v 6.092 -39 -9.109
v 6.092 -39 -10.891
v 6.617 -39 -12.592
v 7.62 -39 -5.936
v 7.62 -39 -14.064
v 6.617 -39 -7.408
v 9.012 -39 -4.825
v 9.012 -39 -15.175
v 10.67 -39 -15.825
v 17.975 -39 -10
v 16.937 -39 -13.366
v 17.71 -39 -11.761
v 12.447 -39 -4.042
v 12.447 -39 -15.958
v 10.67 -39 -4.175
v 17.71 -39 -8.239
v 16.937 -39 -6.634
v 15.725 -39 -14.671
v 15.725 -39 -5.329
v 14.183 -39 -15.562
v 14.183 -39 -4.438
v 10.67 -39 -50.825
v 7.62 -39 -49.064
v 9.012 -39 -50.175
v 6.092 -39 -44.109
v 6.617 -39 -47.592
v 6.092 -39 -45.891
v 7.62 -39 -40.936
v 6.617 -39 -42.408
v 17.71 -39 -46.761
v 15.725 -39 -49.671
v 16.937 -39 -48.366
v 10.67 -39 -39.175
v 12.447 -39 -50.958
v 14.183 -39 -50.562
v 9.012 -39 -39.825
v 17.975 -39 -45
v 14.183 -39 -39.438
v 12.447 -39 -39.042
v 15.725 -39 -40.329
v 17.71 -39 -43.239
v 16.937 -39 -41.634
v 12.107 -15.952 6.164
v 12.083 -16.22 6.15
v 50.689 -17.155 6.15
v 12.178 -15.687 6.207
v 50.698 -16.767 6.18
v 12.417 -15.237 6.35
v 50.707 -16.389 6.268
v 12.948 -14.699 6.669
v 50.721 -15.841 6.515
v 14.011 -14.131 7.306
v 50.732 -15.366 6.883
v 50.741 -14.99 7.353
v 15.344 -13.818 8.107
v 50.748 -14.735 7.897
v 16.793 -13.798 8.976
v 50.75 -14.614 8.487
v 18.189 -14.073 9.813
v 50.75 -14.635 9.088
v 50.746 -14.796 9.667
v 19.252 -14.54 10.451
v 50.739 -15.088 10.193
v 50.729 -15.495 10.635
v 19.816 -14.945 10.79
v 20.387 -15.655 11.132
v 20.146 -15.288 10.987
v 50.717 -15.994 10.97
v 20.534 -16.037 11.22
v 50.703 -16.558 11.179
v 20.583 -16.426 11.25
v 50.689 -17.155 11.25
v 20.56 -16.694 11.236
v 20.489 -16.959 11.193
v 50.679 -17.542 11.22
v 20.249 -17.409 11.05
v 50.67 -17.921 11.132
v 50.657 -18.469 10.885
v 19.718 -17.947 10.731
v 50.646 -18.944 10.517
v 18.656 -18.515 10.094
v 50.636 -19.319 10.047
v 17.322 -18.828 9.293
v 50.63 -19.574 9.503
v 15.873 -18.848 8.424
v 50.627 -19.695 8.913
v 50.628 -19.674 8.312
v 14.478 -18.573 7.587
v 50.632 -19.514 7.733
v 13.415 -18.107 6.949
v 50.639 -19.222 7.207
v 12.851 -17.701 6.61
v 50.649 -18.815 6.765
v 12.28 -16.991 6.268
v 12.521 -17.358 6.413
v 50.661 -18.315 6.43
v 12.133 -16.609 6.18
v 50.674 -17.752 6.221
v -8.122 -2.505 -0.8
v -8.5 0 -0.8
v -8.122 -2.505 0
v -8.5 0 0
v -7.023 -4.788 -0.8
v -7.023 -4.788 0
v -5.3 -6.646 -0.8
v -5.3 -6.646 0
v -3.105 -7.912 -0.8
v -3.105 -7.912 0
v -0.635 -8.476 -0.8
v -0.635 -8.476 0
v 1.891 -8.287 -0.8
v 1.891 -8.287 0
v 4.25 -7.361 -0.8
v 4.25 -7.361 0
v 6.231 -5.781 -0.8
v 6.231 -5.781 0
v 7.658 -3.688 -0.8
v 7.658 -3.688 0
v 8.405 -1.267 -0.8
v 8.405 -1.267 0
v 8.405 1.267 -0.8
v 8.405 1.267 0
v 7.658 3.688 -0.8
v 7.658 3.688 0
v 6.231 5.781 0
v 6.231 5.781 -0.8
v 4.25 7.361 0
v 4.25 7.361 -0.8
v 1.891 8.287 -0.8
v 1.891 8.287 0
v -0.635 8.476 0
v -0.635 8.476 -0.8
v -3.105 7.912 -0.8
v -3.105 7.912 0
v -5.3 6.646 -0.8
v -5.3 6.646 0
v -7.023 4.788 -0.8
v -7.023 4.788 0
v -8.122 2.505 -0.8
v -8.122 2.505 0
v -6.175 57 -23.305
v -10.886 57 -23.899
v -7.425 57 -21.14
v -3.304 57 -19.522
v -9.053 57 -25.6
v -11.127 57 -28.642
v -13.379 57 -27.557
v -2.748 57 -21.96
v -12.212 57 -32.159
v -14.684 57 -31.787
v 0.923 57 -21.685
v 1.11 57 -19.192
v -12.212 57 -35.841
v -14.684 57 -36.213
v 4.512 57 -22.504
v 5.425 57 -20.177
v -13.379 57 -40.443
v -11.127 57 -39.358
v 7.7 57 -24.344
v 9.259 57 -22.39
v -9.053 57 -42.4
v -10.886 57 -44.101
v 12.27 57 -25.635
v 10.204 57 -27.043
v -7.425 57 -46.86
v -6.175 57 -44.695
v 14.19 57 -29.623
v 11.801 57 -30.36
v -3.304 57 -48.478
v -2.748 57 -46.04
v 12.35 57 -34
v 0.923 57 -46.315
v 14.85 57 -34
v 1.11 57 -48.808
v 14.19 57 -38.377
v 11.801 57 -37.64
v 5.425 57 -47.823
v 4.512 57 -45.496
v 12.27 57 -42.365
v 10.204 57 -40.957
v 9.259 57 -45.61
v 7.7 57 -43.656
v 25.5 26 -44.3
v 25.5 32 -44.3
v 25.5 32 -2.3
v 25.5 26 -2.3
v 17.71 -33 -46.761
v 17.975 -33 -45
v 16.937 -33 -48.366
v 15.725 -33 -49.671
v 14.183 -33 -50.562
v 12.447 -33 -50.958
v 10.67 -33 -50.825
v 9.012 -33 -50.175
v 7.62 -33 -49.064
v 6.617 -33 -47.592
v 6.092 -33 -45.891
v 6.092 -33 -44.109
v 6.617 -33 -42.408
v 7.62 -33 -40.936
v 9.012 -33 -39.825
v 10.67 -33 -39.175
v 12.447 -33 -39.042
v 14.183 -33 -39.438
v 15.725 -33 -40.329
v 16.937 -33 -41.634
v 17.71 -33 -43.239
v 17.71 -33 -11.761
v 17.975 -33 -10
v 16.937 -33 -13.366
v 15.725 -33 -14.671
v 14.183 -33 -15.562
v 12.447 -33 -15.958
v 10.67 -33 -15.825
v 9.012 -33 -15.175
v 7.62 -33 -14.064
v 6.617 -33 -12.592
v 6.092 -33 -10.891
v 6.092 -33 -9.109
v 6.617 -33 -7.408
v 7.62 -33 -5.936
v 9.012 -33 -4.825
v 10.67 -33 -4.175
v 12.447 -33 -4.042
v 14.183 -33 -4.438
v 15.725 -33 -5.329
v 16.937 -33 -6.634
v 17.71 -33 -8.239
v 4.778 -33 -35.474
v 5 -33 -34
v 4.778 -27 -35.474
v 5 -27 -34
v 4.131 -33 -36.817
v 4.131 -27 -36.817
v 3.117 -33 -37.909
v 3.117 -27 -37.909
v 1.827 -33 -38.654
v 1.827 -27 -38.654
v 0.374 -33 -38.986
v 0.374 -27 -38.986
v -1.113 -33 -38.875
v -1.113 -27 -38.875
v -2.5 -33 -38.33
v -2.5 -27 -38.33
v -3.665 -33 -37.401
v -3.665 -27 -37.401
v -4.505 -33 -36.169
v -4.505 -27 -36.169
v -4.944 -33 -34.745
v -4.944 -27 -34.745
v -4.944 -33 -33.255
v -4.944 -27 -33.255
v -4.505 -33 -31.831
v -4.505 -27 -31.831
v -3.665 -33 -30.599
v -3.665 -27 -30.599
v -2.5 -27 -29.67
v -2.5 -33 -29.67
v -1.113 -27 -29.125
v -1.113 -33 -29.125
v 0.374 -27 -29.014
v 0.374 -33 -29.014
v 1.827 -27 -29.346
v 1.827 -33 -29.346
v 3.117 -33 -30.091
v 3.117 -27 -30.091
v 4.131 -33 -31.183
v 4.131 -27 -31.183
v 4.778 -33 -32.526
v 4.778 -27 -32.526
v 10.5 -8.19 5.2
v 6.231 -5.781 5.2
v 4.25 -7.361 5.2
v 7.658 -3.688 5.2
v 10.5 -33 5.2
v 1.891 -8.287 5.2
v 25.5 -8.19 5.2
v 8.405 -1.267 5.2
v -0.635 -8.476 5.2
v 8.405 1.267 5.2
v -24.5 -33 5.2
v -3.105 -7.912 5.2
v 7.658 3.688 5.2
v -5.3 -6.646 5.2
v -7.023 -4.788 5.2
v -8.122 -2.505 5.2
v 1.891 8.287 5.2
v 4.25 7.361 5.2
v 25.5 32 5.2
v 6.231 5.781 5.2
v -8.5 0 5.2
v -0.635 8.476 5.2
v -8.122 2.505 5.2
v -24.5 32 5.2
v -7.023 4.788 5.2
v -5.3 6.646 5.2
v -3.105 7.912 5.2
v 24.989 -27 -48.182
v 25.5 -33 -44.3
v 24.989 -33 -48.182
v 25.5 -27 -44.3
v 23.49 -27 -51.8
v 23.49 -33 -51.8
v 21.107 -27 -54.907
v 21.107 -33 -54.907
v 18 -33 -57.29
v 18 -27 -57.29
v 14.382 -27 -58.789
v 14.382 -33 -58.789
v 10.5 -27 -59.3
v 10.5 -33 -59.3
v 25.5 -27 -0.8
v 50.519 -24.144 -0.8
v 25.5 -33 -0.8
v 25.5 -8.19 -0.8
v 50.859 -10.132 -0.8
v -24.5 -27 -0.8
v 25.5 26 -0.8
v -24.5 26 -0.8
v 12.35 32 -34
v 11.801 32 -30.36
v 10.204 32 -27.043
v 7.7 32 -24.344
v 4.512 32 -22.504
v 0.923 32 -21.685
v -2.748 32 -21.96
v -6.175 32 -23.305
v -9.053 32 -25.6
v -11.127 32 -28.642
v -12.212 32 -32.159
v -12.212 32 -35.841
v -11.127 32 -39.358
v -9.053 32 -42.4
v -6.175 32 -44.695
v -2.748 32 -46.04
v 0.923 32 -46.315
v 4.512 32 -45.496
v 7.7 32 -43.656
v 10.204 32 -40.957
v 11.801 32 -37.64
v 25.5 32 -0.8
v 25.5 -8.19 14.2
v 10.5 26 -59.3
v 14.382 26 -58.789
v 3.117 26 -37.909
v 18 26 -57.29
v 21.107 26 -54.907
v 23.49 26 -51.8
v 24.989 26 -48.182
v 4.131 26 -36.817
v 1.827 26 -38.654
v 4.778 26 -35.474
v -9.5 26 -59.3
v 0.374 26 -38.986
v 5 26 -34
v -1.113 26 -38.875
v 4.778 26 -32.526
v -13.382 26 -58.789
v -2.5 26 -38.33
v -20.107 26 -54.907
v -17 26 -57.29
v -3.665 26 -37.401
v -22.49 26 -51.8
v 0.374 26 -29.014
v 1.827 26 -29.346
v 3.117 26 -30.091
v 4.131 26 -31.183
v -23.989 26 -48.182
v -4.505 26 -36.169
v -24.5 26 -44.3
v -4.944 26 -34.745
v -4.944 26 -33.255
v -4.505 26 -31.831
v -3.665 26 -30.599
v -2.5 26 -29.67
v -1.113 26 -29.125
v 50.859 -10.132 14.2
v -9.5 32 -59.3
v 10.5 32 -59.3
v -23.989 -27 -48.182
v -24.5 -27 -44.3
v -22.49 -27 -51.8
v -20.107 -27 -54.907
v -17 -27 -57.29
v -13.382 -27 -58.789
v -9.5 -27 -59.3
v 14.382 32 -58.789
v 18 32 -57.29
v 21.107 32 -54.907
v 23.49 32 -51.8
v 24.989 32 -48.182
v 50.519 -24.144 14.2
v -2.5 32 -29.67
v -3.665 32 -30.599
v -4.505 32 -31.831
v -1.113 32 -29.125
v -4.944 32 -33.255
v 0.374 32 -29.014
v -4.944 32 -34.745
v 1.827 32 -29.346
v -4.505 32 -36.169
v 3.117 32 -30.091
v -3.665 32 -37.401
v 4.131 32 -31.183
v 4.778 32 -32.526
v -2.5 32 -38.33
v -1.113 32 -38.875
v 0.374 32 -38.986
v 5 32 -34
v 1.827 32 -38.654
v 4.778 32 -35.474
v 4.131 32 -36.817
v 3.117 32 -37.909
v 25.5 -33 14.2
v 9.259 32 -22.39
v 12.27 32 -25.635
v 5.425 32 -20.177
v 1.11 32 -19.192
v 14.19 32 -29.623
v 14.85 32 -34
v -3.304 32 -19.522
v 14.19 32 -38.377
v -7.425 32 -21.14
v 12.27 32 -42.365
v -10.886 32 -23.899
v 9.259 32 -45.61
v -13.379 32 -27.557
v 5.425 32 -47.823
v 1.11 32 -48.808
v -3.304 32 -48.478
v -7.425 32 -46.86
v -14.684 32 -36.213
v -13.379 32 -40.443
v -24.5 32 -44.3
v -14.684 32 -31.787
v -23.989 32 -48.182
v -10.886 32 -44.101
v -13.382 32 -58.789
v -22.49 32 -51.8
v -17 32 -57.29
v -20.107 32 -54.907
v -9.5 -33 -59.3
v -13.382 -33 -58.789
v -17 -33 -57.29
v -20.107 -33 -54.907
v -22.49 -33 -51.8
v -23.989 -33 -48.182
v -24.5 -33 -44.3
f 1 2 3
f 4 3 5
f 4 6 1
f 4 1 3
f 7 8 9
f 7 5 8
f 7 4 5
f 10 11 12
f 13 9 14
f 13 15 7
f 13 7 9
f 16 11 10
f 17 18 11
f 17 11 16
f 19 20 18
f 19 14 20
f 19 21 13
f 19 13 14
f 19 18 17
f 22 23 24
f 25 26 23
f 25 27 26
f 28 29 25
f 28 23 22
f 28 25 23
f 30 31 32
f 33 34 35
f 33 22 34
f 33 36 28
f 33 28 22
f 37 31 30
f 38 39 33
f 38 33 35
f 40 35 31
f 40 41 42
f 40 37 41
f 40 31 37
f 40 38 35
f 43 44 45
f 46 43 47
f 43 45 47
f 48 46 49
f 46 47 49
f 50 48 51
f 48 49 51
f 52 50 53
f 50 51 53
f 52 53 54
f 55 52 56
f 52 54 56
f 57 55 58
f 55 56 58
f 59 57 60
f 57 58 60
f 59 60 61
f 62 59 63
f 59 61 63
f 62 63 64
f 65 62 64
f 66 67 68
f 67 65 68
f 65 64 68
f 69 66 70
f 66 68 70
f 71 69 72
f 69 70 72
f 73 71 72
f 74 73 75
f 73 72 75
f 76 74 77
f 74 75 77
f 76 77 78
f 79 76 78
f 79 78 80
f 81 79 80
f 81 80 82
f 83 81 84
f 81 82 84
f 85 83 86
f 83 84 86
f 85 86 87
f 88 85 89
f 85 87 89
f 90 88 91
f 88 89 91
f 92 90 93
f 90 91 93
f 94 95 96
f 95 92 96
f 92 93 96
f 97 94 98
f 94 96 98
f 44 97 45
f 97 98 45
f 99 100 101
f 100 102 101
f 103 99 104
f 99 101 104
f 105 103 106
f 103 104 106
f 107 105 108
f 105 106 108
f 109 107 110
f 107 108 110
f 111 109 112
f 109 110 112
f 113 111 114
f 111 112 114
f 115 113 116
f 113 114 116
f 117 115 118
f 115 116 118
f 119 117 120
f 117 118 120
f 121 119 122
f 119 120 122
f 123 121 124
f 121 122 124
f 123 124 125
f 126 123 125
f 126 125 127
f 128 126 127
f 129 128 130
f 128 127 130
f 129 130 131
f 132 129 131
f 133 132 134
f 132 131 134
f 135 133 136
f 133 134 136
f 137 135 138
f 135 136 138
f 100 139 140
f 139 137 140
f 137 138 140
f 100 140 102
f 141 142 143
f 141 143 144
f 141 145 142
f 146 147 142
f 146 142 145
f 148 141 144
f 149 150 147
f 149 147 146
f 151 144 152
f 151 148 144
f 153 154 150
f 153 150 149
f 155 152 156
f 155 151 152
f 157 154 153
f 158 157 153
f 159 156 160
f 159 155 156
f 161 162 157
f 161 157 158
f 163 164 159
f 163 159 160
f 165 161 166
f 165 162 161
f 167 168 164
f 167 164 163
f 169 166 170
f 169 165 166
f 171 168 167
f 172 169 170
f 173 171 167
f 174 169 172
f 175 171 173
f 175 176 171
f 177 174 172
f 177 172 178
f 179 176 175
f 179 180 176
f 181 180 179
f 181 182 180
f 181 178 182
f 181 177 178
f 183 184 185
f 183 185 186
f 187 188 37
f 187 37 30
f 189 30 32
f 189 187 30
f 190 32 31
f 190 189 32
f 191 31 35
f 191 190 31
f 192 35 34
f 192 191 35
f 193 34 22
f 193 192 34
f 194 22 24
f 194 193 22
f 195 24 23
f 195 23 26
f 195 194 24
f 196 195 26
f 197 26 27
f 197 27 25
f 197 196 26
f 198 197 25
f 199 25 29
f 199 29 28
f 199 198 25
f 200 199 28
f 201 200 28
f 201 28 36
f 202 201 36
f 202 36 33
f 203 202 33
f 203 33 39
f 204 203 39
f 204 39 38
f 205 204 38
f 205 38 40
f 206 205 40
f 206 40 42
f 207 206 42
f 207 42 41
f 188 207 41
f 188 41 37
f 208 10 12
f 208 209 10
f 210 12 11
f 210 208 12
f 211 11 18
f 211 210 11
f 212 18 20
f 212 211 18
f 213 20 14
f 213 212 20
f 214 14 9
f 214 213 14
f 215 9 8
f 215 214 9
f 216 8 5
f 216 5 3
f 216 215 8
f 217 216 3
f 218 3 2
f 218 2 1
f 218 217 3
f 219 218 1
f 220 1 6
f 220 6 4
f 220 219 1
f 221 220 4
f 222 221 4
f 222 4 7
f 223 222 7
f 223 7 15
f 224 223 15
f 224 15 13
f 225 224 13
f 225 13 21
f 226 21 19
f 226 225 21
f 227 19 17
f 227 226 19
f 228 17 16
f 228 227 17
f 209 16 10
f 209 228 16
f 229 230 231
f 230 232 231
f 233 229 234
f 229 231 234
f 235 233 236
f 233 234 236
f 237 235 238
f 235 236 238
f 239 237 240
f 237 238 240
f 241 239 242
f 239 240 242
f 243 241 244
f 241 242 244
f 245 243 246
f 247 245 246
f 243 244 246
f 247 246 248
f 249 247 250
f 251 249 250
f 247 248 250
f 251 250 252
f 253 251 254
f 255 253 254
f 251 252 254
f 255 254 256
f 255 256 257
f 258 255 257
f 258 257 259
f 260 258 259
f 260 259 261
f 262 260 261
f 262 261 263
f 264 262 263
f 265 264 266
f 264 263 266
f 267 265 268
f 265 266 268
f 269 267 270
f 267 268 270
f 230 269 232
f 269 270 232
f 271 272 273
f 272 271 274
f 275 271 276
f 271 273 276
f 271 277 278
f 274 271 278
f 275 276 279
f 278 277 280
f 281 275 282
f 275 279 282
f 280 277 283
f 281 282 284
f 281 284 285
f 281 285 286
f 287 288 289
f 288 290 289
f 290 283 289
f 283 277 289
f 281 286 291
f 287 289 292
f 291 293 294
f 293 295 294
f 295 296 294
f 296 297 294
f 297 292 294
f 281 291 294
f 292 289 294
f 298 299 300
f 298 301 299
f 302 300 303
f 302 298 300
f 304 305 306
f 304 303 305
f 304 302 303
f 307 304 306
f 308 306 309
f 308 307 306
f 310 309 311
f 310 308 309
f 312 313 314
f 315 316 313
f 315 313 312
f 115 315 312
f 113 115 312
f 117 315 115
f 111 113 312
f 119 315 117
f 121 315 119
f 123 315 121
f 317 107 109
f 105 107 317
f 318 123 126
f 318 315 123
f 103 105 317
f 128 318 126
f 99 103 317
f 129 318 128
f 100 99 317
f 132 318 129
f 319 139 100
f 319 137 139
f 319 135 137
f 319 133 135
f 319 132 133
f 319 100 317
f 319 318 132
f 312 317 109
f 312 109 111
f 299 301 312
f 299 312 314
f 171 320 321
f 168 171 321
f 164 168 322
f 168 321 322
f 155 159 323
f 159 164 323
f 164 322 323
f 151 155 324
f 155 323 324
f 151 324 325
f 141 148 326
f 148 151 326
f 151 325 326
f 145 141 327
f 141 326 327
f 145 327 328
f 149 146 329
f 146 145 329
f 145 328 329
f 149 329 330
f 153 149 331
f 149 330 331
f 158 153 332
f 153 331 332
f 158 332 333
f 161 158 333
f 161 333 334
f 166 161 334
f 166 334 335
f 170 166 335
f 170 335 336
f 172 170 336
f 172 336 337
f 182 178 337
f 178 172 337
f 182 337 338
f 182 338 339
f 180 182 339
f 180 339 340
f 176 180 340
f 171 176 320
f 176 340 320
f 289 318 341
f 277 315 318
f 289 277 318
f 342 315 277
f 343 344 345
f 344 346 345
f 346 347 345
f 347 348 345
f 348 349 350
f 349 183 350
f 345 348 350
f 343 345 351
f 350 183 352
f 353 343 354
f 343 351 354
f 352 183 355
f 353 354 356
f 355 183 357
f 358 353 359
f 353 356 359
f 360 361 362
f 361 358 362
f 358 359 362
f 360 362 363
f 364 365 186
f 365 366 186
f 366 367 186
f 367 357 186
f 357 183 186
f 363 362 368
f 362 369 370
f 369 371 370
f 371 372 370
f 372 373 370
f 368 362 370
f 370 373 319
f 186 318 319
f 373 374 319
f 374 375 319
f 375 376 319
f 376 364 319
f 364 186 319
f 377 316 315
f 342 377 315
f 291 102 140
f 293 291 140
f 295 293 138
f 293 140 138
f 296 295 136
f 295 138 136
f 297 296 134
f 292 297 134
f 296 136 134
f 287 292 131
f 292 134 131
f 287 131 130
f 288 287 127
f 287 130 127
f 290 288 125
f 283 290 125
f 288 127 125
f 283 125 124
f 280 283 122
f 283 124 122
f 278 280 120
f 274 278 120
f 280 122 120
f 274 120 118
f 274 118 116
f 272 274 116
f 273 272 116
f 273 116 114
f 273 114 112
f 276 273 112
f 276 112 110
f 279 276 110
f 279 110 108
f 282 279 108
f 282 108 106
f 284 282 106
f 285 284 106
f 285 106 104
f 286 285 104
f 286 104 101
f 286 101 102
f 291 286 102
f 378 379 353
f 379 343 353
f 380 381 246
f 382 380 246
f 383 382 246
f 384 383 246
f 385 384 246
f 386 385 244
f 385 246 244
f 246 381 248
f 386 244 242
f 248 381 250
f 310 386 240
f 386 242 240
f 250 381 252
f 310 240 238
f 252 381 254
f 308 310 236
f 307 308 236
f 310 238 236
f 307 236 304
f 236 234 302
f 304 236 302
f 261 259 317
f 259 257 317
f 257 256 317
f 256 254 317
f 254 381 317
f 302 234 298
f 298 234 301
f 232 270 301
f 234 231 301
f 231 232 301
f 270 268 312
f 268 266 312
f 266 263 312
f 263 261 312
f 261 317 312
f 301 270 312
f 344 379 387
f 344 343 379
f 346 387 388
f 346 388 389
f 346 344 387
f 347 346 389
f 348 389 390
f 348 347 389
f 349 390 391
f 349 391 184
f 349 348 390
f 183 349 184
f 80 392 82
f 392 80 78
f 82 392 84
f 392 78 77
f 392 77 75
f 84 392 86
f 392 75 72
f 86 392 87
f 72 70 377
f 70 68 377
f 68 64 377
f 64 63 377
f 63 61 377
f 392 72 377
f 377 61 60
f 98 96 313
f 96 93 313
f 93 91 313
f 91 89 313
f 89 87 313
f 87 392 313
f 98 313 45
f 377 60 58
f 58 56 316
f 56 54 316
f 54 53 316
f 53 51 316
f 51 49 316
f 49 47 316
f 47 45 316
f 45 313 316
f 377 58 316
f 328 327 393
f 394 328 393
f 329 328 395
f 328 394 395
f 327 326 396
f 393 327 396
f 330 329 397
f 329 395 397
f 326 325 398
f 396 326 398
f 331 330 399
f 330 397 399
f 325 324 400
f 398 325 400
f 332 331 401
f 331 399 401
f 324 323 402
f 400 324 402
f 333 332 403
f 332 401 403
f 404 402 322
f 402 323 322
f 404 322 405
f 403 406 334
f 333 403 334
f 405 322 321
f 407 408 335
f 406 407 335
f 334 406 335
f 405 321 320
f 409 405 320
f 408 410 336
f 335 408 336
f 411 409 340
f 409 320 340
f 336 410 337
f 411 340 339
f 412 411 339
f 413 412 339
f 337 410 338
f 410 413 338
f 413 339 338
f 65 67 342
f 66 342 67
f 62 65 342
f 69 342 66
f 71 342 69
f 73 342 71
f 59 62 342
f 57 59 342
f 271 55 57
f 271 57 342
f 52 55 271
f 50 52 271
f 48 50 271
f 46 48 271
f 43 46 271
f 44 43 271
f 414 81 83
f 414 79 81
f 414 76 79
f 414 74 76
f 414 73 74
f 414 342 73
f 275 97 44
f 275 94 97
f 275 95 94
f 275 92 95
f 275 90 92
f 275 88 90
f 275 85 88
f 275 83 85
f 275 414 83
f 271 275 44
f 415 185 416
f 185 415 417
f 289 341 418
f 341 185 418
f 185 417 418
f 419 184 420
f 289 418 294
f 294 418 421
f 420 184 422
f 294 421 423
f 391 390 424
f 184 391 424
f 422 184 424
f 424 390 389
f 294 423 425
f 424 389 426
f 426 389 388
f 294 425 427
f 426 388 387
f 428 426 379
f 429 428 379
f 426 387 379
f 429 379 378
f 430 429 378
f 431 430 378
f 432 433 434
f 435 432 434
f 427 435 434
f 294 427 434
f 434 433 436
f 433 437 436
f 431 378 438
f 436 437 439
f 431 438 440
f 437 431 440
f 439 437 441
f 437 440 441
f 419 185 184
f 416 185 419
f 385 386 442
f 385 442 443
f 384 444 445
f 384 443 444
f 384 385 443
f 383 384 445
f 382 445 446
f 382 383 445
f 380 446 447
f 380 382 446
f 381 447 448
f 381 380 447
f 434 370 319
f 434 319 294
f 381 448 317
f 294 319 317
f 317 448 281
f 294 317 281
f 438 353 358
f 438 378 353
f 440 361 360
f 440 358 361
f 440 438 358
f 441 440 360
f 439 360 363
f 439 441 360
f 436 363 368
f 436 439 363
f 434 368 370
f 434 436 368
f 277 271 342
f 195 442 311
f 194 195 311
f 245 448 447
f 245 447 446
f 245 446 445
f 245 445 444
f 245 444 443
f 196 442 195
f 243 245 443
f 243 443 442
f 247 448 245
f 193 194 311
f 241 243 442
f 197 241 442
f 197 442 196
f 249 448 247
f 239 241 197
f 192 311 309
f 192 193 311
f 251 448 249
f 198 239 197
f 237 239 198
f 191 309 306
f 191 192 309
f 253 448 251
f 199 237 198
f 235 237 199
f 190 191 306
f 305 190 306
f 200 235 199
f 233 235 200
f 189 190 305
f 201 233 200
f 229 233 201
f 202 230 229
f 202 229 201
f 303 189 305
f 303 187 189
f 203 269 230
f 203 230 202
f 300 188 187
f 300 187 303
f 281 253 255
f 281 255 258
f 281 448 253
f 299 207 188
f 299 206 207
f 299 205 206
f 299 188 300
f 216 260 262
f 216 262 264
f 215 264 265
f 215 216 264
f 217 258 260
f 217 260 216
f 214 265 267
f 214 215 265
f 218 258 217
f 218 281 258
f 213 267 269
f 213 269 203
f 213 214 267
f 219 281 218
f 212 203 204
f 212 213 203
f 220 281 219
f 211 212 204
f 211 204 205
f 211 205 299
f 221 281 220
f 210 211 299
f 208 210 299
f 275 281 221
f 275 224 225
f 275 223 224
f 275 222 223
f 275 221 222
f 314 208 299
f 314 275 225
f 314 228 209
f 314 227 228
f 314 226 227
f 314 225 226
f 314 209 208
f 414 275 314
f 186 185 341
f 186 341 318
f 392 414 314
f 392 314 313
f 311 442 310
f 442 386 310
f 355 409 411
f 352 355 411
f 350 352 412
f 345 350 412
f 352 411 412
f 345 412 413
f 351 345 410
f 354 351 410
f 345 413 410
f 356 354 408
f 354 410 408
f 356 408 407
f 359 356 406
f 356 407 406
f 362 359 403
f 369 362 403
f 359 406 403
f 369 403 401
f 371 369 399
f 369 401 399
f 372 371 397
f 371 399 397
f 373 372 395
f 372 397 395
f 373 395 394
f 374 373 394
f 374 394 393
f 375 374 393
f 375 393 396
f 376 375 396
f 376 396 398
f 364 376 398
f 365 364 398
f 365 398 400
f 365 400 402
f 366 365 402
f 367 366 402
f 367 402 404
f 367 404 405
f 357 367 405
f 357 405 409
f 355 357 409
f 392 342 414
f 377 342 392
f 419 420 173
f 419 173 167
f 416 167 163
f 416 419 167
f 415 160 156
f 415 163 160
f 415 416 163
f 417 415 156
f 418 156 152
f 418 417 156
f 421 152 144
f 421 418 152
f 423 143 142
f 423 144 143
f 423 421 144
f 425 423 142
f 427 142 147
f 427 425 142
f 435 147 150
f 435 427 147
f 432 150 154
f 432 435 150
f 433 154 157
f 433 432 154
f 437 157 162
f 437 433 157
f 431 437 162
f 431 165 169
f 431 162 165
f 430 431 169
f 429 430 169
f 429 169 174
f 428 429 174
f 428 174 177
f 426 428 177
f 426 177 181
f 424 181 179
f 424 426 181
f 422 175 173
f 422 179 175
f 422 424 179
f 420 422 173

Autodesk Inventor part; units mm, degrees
sketch "Sketch1" plane through (0, 0, 0) normal (0, 0, 1) x (1, 0, 0)
  line L0 (25.5, -27) -> (-25.5, -27)
  line L1 (-25.5, -27) -> (-25.5, 27)
  line L2 (-25.5, 27) -> (25.5, 27)
  line L3 (25.5, 27) -> (25.5, -27)
  line L4 (25.5, -27) -> (-25.5, 27) construction
  line L5 (-25.5, -27) -> (25.5, 27) construction
  point P0 (0, 0)
  dimension "d0" = 51
  dimension "d1" = 54
extrude "Extrusion1" add sketch "Sketch1" along normal blind 6
sketch "Sketch2" plane through (0, 0, 6) normal (0, 0, 1) x (1, 0, 0)
  circle A0 centre (0, 0) radius 15
  dimension "d4" = 30
sketch "Sketch4" plane through (0, 0, 6) normal (0, 0, 1) x (1, 0, 0)
  line L0 (-25.5, 27) -> (26.5, 27)
  line L1 (-25.5, -27) -> (25.5, -27) projected
  line L2 (25.5, -27) -> (-25.5, -27)
  line L3 (-25.5, -27) -> (-25.5, -33)
  line L4 (-25.5, -33) -> (25.5, -33)
  line L5 (25.5, -33) -> (25.5, -27)
  point P0 (0, 0)
  dimension "d109" = 51
  dimension "d110" = 6
extrude "Extrusion4" add sketch "Sketch4" against normal blind 65.3
ref_plane "Plano de trabajo8" through (25.5, -33.8, -42) normal (1, 0, 0) x (0, 0, -1)
ref_plane "Work Plane9" through (-10.5, -27, -57) normal (0, 1, 0) x (1, 0, 0)
sketch "Sketch25" plane through (-10.5, -27, -57) normal (0, 1, 0) x (1, 0, 0)
  line L0 (0, 0) -> (21, 0) projected
  line L1 (10.5, 0) -> (10.5, -23)
  circle A0 centre (10.5, -23) radius 5
  line L2 (10.5, -23) -> (10.5, -63)
  line L3 (36, -63) -> (-15, -63) projected
  point P0 (10.5, -57)
  dimension "d111" = 23
  dimension "d112" = 10
extrude "Extrusion22" cut sketch "Sketch25" against normal blind 68
ref_plane "Work Plane7" through (-10.5, -0.5, -57) normal (0, 1, 0) x (1, 0, 0)
mirror "Mirror2" about plane through (-10.5, -0.5, -57) normal (0, 1, 0) of "Extrusion4"
extrude "Extrusión28" cut sketch "Sketch2" against normal blind 10
ref_plane "Work Plane10" through (25.5, -34, -42) normal (1, 0, 0) x (0, 0, -1)
ref_plane "Work Plane11" through (-25.5, -87, 1.3) normal (0, 1, 0) x (1, 0, 0)
sketch "Sketch37" plane through (-25.5, 32, 6) normal (0, 1, 0) x (1, 0, 0)
  circle A0 centre (25.5, 40) radius 5 projected
  point P0 (25.5, 6)
extrude "Extrusion33" cut sketch "Sketch37" against normal blind 68
sketch "Sketch43" plane through (0, 0, 6) normal (0, 0, 1) x (1, 0, 0)
  circle A0 centre (0, 0) radius 10.4895
  circle A1 centre (0, 0) radius 15 projected
  circle A2 centre (0, 0) radius 5
  dimension "d182" = 10
extrude "Extrusion40" add sketch "Sketch43" against normal blind 8.3 contours A0 | A1
sketch "Boceto48" plane through (-25.5, -33, 6) normal (0, -1, 0) x (1, 0, 0)
  point P0 (25.5, -6)
sketch "Boceto49" plane through (-25.5, -33, 6) normal (0, -1, 0) x (1, 0, 0)
  point P0 (25.5, -6)
sketch "Boceto50" plane through (25.5, 26, -59.3) normal (0, 0, -1) x (-1, 0, 0)
  point P0 (25.5, -26)
sketch "Boceto77" plane through (0, 0, 6) normal (0, 0, 1) x (1, 0, 0)
  point P0 (0, 0)
sketch "Boceto84" plane through (25.5, -33, -59.3) normal (1, 0, 0) x (0, 0, -1)
  line L0 (-65.3, 0) -> (-65.3, 65) projected
  line L1 (-65.3, 0) -> (-65.3, 32.3804)
  line L2 (-65.3, 32.3804) -> (-80.5662, 32.3804)
  line L3 (-80.5662, 32.3804) -> (-80.5662, -6.9517)
  line L4 (-80.5662, -6.9517) -> (-65.3, -6.9517)
  line L5 (-65.3, -6.9517) -> (-65.3, 0)
  point P0 (-59.3, 33)
  point P1 (-65.3, 66.9563)
  point P2 (-65.3, 65.9563)
extrude "Extrusión80" cut sketch "Boceto84" along normal mid plane 100
sketch "Boceto85" plane through (0, 0, 0) normal (0, 0, -1) x (-1, 0, 0)
  line L0 (-25.5, -33) -> (-25.5, -4.0448)
  line L1 (-25.5, -27) -> (-25.5, 26) projected
  line L2 (-25.5, -4.0448) -> (-53.9802, -4.6672)
  line L3 (-53.9802, -4.6672) -> (-54.6281, -33.6366)
  line L4 (-54.6281, -33.6366) -> (-25.5, -33)
  point P0 (0, 0)
  point P1 (-25.5, -13.7947)
extrude "Extrusión81" cut sketch "Boceto85" along normal mid plane 100
sketch "Boceto90" plane through (0, 0, 6) normal (0, 0, 1) x (1, 0, 0)
  circle A0 centre (0, 0) radius 5.2249
  circle A1 centre (0, 0) radius 14.4421
extrude "Extrusión86" add sketch "Boceto90" along normal blind 4.7
fillet "Empalme20" radius 2 1 edges at (-14.4421, 0, 6)
sketch "Boceto91" plane through (0, 0, 0) normal (0, 0, -1) x (-1, 0, 0)
  point P0 (0, 0)
sketch "Boceto92" plane through (0, 0, 0) normal (0, 0, -1) x (-1, 0, 0)
  point P0 (0, 0)
sketch "Boceto93" plane through (0, 0, 0) normal (0, 0, -1) x (-1, 0, 0)
  line L0 (-25.5, -27) -> (-25.5, 26) projected
  line L1 (-25.5, 1.3668) -> (-41.5813, 1.3668)
  line L2 (-41.5813, 1.3668) -> (-41.5813, -33)
  line L3 (-25.5, -33) -> (-41.5813, -33)
  line L4 (-25.5, -33) -> (-25.5, 32.9563) projected
  line L5 (-25.5, 1.3668) -> (-25.5, -33)
  point P0 (0, 0)
extrude "Extrusión87" add sketch "Boceto93" against normal blind 8.3
sketch "Boceto94" plane through (0, 0, 6) normal (0, 0, 1) x (1, 0, 0)
  line L0 (41.5813, -33) -> (41.5813, 1.3668) projected
  line L1 (41.5813, 1.3668) -> (41.5813, 35.5236)
  line L2 (-25.5, 32.9563) -> (25.5, 32.9563) projected
  line L3 (25.5, 32.9563) -> (41.5813, 32.9563)
  line L4 (25.5, 32.9563) -> (25.5, 1.3668)
  line L5 (25.5, 1.3668) -> (41.5813, 1.3668)
  point P0 (0, 0)
extrude "Extrusión88" add sketch "Boceto94" against normal blind 8.3
sketch "Boceto95" plane through (0, 0, 6) normal (0, 0, 1) x (1, 0, 0)
  circle A0 centre (37.8913, -24.81) radius 2.6
  line L0 (35.2913, -24.81) -> (37.8913, -24.81)
  point P0 (0, 0)
  point P1 (41.5813, -33)
  dimension "d305" = 5.2
extrude "Extrusión89" cut sketch "Boceto95" against normal blind 8.3
sketch "Boceto97" plane through (-25.5, -33, -59.3) normal (-1, 0, 0) x (0, 0, 1)
  line L0 (59.3, 0) -> (67.6, 0) projected
  line L1 (67.6, 0) -> (89.1392, 0)
  line L2 (89.1392, 0) -> (89.1392, 69.8717)
  line L3 (89.1392, 69.8717) -> (67.6, 69.8717)
  line L4 (67.6, 69.8717) -> (67.6, 0)
  point P0 (59.3, 33)
extrude "Extrusión92" cut sketch "Boceto97" against normal blind 1000
sketch "Boceto98" plane through (-25.5, -33, -59.3) normal (-1, 0, 0) x (0, 0, 1)
  line L0 (59.3, 59) -> (59.3, 6) projected
  line L1 (59.3, 59) -> (58.3, 59) projected
  line L2 (59.3, 6) -> (59.3, 59)
  line L3 (59.3, 59) -> (56.1979, 59)
  line L4 (59.3, 59) -> (0, 59) projected
  line L5 (56.1979, 59) -> (56.1979, 6)
  line L6 (59.3, 6) -> (0, 6) projected
  line L7 (56.1979, 6) -> (59.3, 6)
  line L8 (65.3, 65) -> (0, 65) projected
  line L9 (56.1979, 65) -> (56.1979, 67.4992)
  line L10 (56.1979, 67.4992) -> (67.7631, 67.4992)
  line L11 (67.7631, 67.4992) -> (76.364, 67.4992)
  line L12 (76.364, 67.4992) -> (76.364, -7.6447)
  line L13 (65.3, 0) -> (65.3, 34.3668) projected
  line L14 (65.3, 0) -> (65.3, -7.6447)
  line L15 (65.3, -7.6447) -> (76.364, -7.6447)
  line L16 (65.3, 0) -> (65.3, 65)
  line L17 (65.3, 0) -> (65.3, 65) projected
  line L18 (56.1979, 65) -> (65.3, 65)
  point P0 (59.3, 33)
  point P1 (59.3, 51.8098)
  point P2 (58.3, 65)
  point P3 (65.3, 65.9563)
  point P4 (59.3, 51.8098)
  point P5 (58.3, 65)
  point P6 (65.3, 34.3668)
extrude "Extrusión93" cut sketch "Boceto98" along normal mid plane 1000
sketch "Boceto99" plane through (41.5813, -33, 0) normal (1, 0, 0) x (0, 0, -1)
  line L0 (0, 58.9816) -> (2.3, 58.9816)
  line L1 (2.3, 65) -> (2.3, 59) projected
  line L2 (2.3, 58.9816) -> (2.3, 65)
  line L3 (2.3, 65) -> (2.3, 58.9816)
  line L4 (2.3, 65) -> (0, 65)
  line L5 (-6, 65) -> (59.3, 65) projected
  line L6 (0, 58.9816) -> (0, 65)
  point P0 (0, 33)
extrude "Extrusión94" cut sketch "Boceto99" against normal blind 16.081
sketch "Boceto100" plane through (25.5, 26, -59.3) normal (0, 0, -1) x (-1, 0, 0)
  line L0 (-16.0813, 6) -> (-0.0003, 6) projected
  line L1 (0, 0) -> (-16.0813, 0)
  line L2 (-16.0813, 0) -> (-16.0813, 6)
  line L3 (-16.0813, 6) -> (0, 6)
  line L4 (0, 6) -> (0, 0)
  point P0 (25.5, -26)
  point P1 (-0.0003, 6)
extrude "Extrusión95" cut sketch "Boceto100" against normal blind 59.3
sketch "Boceto101" plane through (0, 0, 0) normal (0, 0, -1) x (-1, 0, 0)
  circle A0 centre (0, 0) radius 8.5
  dimension "d322" = 17
extrude "Extrusión96" cut sketch "Boceto101" against normal blind 59.3
sketch "Boceto102" plane through (-25.5, 32, -59.3) normal (0, 1, 0) x (1, 0, 0)
  circle A0 centre (25.5, -25.3) radius 5 projected
  circle A1 centre (25.5, -25.3) radius 12.35
  circle A2 centre (25.5, -25.3) radius 14.85
  point P0 (25.5, -59.3)
  dimension "d325" = 24.7
  dimension "d326" = 29.7
extrude "Extrusión97" add sketch "Boceto102" along normal blind 25 contours A2
sketch "Boceto103" plane through (-25.5, -27, -59.3) normal (0, 1, 0) x (1, 0, 0)
  point P0 (25.5, -59.3)
sketch "Boceto104" plane through (0, 0, 6) normal (0, 0, 1) x (1, 0, 0)
  line L0 (-25.5, -33) -> (-25.5, 32) projected
  line L1 (41.5813, 32) -> (41.5813, -33) projected
  line L2 (-25.5, 32) -> (41.5813, 32)
  line L3 (41.5813, 32) -> (41.5813, -33)
  line L4 (41.5813, -33) -> (-25.5, -33)
  line L5 (-25.5, -33) -> (-25.5, 32)
  point P0 (0, 0)
extrude "Extrusión98" cut sketch "Boceto104" against normal blind 0.8
sketch "Boceto105" plane through (0, 0, 0) normal (0, 0, -1) x (-1, 0, 0)
  line L0 (-25.5, -33) -> (25.5, -33) projected
  line L1 (-41.5813, 32) -> (25.5, 32)
  line L2 (25.5, 32) -> (25.5, -33)
  line L3 (25.5, -33) -> (-41.5813, -33)
  line L4 (-41.5813, -33) -> (-41.5813, 32)
  circle A0 centre (-37.8913, -24.81) radius 2.6 projected
  circle A1 centre (-37.8913, -24.81) radius 2.6
  circle A2 centre (0, 0) radius 8.5
extrude "Extrusión99" add sketch "Boceto105" along normal blind 0.8
sketch "Boceto106" plane through (-25.5, -33, -59.3) normal (0, -1, 0) x (1, 0, 0)
  line L0 (0, 0) -> (51, 0) projected
  line L1 (67.0813, 64.5) -> (0, 64.5) projected
  line L2 (0, 0) -> (1, 0)
  line L3 (1, 0) -> (1, 64.5)
  line L4 (1, 64.5) -> (0, 64.5)
  line L5 (0, 64.5) -> (0, 0)
  point P0 (25.5, 59.3)
  point P1 (0, 64.5)
  point P2 (1, 0)
  dimension "d333" = 1
extrude "Extrusión100" cut sketch "Boceto106" against normal blind 1000
sketch "Boceto107" plane through (0, 0, -0.8) normal (0, 0, -1) x (-1, 0, 0)
  line L0 (-25.5, -33) -> (-25.5, -38.9196)
  line L1 (-25.5, -38.9196) -> (-33.0828, -52.767)
  line L2 (-33.0828, -52.767) -> (-34.3078, -45.7968) construction
  line L3 (-41.5813, -33) -> (24.5, -33) projected
  spline S0 degree 3 poles (-33.0828, -52.767) (-34.3078, -45.7968) (-36.0426, -41.6296) (-38.17, -38.0712) knots 1 1 1 1 1.670244 1.670244 1.670244 1.670244
  line L4 (-41.5813, 32) -> (-41.5813, -33) projected
  line L5 (-37.8729, -38.2076) -> (-46.4829, -34.2556)
  line L6 (-46.4829, -34.2556) -> (-46.4829, 32)
  line L7 (-46.4829, 32) -> (-41.5813, 32)
  line L8 (-34.3078, -45.7968) -> (-36.0426, -41.6296) construction
  line L9 (-36.0426, -41.6296) -> (-38.17, -38.0712) construction
  point P0 (0, 0)
extrude "Extrusión101" add sketch "Boceto107" against normal blind 6
fillet "Empalme21" radius 2 2 edges at (38.17, -38.0712, 2.2) (46.4829, -34.2556, 2.2)
sketch "Boceto108" plane through (-24.5, -33, 5.2) normal (0, -1, 0) x (1, 0, 0)
  circle A0 centre (24.5, -39.2) radius 5 projected
  line L0 (50, -6) -> (0, -6) projected
  circle A1 centre (36.5, -15.2) radius 5.975
  circle A2 centre (36.5, -50.2) radius 5.975
  line L1 (36.5, -15.2) -> (36.5, -50.2)
  point P0 (24.5, -5.2)
  dimension "d344" = 11.95
  dimension "d345" = 11.95
  dimension "d392" = 35
extrude "Extrusión102" add sketch "Boceto108" along normal blind 6 contours A1 | A2
sketch "Boceto109" plane through (0, 0, -0.8) normal (0, 0, -1) x (-1, 0, 0)
  line L0 (-45.3172, -34.7906) -> (-38.7421, -37.8086) projected
  line L1 (-45.3172, -34.7906) -> (-49.6596, -32.7974)
  line L2 (-49.6596, -32.7974) -> (-49.6596, 32)
  line L3 (-46.4829, 32) -> (-46.4829, -32.9729) projected
  line L4 (-49.6596, 32) -> (-46.4829, 32)
  arc A0 (-46.4829, -32.9729) -> (-45.3172, -34.7906) centre (-44.4829, -32.9729) ccw projected
  line L5 (-46.4829, 32) -> (-45.3172, -34.7906)
  point P0 (0, 0)
extrude "Extrusión103" add sketch "Boceto109" against normal blind 6 contours L1 L2 L4 L3 A0
fillet "Empalme23" radius 4 2 edges at (49.6596, -32.7974, 2.2) (49.6596, 32, 2.2)
sketch "Boceto110" plane through (0, 0, 5.2) normal (0, 0, 1) x (1, 0, 0)
  line L0 (33.0828, -52.767) -> (25.5, -38.9196) projected
  line L1 (25.5, -38.9196) -> (37.9157, -38.9196)
  line L2 (37.9157, -38.9196) -> (33.0828, -52.767)
  line L3 (33.0828, -52.767) -> (25.5, -38.9196)
  point P0 (0, 0)
extrude "Extrusión104" cut sketch "Boceto110" against normal blind 10
sketch "Sketch111" plane through (0, 0, 5.2) normal (0, 0, 1) x (1, 0, 0)
  line L0 (25.5, -33) -> (25.5, -38.9196) projected
  line L1 (38.7421, -37.8086) -> (47.3283, -33.8675) projected
  line L2 (25.5, -33) -> (47.3283, -33.8675)
  line L3 (37.6774, -38.9196) -> (25.5, -38.9196) projected
  line L4 (25.5, -38.9196) -> (37.6774, -38.9196)
  line L5 (37.6774, -38.9196) -> (38.7421, -37.8086)
  point P0 (0, 0)
extrude "Extrusion105" cut sketch "Sketch111" against normal blind 10
sketch "Sketch114" plane through (0, 0, -0.8) normal (0, 0, -1) x (-1, 0, 0)
  line L0 (-25.5, 32) -> (-25.5, 26) projected
  line L1 (-25.5, 26) -> (-25.5, 32)
  line L2 (-25.5, 32) -> (-25.5, -13.2226)
  line L3 (-25.5, -13.2226) -> (-49.6596, -13.2226)
  line L4 (-49.6596, -30.2322) -> (-49.6596, 28) projected
  line L5 (-49.6596, 28) -> (-49.6596, -30.2322) projected
  line L6 (-49.6596, -13.2226) -> (-49.6596, 28)
  line L7 (-25.5, 32) -> (-45.6596, 32) projected
  arc A0 (-45.6596, 32) -> (-49.6596, 28) centre (-45.6596, 28) ccw projected
  arc A1 (-45.6596, 32) -> (-49.6596, 28) centre (-45.6596, 28) ccw
  line L8 (-45.6596, 32) -> (-25.5, 32)
  point P0 (0, 0)
extrude "Extrusion108" cut sketch "Sketch114" against normal blind 6
sketch "Sketch115" plane through (0, 0, -59.3) normal (0, 0, -1) x (-1, 0, 0)
  line L0 (-50.9952, -38.1245) -> (29.0048, -38.1245)
  line L1 (29.0048, -38.1245) -> (29.0048, 81.8755)
  line L2 (29.0048, 81.8755) -> (-50.9952, 81.8755)
  line L3 (-50.9952, 81.8755) -> (-50.9952, -38.1245)
  point P0 (0, 0)
  dimension "d363" = 80
  dimension "d364" = 120
sketch "Sketch116" plane through (0, 0, 5.2) normal (0, 0, 1) x (1, 0, 0)
  line L0 (25.5, -33) -> (-24.5, -33) projected
  line L1 (25.5, -33) -> (50.5194, -24.1438)
  line L2 (50.5194, -24.1438) -> (50.8592, -10.1321)
  line L3 (50.8592, -10.1321) -> (25.5, -8.1902)
  line L4 (25.5, 26) -> (25.5, -13.2226) projected
  line L5 (25.5, -27) -> (25.5, -33) projected
  line L6 (25.5, -33) -> (25.5, -8.1902)
  line L7 (25.5, -33) -> (62.3665, -33)
  line L8 (62.3665, -33) -> (62.3665, 19.7655)
  line L9 (62.3665, 19.7655) -> (25.5, 19.7655)
  line L10 (25.5, 19.7655) -> (25.5, -33)
  line L11 (62.3665, 19.7655) -> (25.5, 19.7655)
  line L12 (25.5, 19.7655) -> (25.5, -84.5573)
  line L13 (25.5, -84.5573) -> (62.3665, -84.5573)
  line L14 (62.3665, -84.5573) -> (62.3665, 19.7655)
  point P0 (0, 0)
extrude "Extrusion109" add sketch "Sketch116" along normal blind 9 and the other way blind 6 contours L5 L6 L4 L3 L2 L1
sketch "Sketch117" plane through (50.8592, -10.1321, 14.2) normal (0.9997, -0.0242, 0) x (0, 0, -1)
  line L0 (1.2948, -7.0247) -> (1.2483, -7.0247)
  line L1 (0, 1.3265) -> (0, -23.476) projected
  line L2 (9, -23.476) -> (9, 1.3265) projected
  circle A0 centre (5.5, -7.0247) radius 2.55
  line L3 (0, -7.0247) -> (5.5, -7.0247)
  point P0 (14.2, 8.896)
  dimension "d387" = 5.5
  dimension "d388" = 5.1
extrude "Extrusion111" cut sketch "Sketch116" against normal blind 20 contours L1 L2 L3 L4 L9 L8 L7 | L7 L14 L13 L12
sketch "Sketch118" plane through (-24.5, -33, -59.3) normal (0, -1, 0) x (1, 0, 0)
  line L0 (75.3592, 73.5) -> (50, 73.5) projected
  line L1 (50, 64.5) -> (50, 73.5) projected
  line L2 (50, 73.5) -> (50, 64.5)
  line L3 (50, 64.5) -> (35, 64.5)
  line L4 (50, 73.5) -> (35, 64.5)
  line L5 (50, 73.5) -> (35, 73.5)
  line L6 (35, 73.5) -> (35, 64.5)
  point P0 (24.5, 59.3)
  dimension "d373" = 15
extrude "Extrusion112" add sketch "Sketch118" against normal blind 24.81 contours L3 L4 L1
sketch "Sketch119" plane through (0, 0, 5.2) normal (0, 0, 1) x (1, 0, 0)
  circle A0 centre (0, 0) radius 12.5
  dimension "d376" = 25
extrude "Extrusion113" cut sketch "Sketch119" along normal blind 24.81
extrude "Extrusion115" cut sketch "Sketch117" against normal blind 40
fillet "Fillet25" radius 15 4 edges at (-24.5, -30, -59.3) (25.5, -30, -59.3) (25.5, 29, -59.3) (-24.5, 29, -59.3)
ref_plane "Work Plane3" through (-10.35, 26, -57) normal (0, 1, 0) x (1, 0, 0)
properties part number "C23[i3][L][2]" material "Aluminum 6061"
